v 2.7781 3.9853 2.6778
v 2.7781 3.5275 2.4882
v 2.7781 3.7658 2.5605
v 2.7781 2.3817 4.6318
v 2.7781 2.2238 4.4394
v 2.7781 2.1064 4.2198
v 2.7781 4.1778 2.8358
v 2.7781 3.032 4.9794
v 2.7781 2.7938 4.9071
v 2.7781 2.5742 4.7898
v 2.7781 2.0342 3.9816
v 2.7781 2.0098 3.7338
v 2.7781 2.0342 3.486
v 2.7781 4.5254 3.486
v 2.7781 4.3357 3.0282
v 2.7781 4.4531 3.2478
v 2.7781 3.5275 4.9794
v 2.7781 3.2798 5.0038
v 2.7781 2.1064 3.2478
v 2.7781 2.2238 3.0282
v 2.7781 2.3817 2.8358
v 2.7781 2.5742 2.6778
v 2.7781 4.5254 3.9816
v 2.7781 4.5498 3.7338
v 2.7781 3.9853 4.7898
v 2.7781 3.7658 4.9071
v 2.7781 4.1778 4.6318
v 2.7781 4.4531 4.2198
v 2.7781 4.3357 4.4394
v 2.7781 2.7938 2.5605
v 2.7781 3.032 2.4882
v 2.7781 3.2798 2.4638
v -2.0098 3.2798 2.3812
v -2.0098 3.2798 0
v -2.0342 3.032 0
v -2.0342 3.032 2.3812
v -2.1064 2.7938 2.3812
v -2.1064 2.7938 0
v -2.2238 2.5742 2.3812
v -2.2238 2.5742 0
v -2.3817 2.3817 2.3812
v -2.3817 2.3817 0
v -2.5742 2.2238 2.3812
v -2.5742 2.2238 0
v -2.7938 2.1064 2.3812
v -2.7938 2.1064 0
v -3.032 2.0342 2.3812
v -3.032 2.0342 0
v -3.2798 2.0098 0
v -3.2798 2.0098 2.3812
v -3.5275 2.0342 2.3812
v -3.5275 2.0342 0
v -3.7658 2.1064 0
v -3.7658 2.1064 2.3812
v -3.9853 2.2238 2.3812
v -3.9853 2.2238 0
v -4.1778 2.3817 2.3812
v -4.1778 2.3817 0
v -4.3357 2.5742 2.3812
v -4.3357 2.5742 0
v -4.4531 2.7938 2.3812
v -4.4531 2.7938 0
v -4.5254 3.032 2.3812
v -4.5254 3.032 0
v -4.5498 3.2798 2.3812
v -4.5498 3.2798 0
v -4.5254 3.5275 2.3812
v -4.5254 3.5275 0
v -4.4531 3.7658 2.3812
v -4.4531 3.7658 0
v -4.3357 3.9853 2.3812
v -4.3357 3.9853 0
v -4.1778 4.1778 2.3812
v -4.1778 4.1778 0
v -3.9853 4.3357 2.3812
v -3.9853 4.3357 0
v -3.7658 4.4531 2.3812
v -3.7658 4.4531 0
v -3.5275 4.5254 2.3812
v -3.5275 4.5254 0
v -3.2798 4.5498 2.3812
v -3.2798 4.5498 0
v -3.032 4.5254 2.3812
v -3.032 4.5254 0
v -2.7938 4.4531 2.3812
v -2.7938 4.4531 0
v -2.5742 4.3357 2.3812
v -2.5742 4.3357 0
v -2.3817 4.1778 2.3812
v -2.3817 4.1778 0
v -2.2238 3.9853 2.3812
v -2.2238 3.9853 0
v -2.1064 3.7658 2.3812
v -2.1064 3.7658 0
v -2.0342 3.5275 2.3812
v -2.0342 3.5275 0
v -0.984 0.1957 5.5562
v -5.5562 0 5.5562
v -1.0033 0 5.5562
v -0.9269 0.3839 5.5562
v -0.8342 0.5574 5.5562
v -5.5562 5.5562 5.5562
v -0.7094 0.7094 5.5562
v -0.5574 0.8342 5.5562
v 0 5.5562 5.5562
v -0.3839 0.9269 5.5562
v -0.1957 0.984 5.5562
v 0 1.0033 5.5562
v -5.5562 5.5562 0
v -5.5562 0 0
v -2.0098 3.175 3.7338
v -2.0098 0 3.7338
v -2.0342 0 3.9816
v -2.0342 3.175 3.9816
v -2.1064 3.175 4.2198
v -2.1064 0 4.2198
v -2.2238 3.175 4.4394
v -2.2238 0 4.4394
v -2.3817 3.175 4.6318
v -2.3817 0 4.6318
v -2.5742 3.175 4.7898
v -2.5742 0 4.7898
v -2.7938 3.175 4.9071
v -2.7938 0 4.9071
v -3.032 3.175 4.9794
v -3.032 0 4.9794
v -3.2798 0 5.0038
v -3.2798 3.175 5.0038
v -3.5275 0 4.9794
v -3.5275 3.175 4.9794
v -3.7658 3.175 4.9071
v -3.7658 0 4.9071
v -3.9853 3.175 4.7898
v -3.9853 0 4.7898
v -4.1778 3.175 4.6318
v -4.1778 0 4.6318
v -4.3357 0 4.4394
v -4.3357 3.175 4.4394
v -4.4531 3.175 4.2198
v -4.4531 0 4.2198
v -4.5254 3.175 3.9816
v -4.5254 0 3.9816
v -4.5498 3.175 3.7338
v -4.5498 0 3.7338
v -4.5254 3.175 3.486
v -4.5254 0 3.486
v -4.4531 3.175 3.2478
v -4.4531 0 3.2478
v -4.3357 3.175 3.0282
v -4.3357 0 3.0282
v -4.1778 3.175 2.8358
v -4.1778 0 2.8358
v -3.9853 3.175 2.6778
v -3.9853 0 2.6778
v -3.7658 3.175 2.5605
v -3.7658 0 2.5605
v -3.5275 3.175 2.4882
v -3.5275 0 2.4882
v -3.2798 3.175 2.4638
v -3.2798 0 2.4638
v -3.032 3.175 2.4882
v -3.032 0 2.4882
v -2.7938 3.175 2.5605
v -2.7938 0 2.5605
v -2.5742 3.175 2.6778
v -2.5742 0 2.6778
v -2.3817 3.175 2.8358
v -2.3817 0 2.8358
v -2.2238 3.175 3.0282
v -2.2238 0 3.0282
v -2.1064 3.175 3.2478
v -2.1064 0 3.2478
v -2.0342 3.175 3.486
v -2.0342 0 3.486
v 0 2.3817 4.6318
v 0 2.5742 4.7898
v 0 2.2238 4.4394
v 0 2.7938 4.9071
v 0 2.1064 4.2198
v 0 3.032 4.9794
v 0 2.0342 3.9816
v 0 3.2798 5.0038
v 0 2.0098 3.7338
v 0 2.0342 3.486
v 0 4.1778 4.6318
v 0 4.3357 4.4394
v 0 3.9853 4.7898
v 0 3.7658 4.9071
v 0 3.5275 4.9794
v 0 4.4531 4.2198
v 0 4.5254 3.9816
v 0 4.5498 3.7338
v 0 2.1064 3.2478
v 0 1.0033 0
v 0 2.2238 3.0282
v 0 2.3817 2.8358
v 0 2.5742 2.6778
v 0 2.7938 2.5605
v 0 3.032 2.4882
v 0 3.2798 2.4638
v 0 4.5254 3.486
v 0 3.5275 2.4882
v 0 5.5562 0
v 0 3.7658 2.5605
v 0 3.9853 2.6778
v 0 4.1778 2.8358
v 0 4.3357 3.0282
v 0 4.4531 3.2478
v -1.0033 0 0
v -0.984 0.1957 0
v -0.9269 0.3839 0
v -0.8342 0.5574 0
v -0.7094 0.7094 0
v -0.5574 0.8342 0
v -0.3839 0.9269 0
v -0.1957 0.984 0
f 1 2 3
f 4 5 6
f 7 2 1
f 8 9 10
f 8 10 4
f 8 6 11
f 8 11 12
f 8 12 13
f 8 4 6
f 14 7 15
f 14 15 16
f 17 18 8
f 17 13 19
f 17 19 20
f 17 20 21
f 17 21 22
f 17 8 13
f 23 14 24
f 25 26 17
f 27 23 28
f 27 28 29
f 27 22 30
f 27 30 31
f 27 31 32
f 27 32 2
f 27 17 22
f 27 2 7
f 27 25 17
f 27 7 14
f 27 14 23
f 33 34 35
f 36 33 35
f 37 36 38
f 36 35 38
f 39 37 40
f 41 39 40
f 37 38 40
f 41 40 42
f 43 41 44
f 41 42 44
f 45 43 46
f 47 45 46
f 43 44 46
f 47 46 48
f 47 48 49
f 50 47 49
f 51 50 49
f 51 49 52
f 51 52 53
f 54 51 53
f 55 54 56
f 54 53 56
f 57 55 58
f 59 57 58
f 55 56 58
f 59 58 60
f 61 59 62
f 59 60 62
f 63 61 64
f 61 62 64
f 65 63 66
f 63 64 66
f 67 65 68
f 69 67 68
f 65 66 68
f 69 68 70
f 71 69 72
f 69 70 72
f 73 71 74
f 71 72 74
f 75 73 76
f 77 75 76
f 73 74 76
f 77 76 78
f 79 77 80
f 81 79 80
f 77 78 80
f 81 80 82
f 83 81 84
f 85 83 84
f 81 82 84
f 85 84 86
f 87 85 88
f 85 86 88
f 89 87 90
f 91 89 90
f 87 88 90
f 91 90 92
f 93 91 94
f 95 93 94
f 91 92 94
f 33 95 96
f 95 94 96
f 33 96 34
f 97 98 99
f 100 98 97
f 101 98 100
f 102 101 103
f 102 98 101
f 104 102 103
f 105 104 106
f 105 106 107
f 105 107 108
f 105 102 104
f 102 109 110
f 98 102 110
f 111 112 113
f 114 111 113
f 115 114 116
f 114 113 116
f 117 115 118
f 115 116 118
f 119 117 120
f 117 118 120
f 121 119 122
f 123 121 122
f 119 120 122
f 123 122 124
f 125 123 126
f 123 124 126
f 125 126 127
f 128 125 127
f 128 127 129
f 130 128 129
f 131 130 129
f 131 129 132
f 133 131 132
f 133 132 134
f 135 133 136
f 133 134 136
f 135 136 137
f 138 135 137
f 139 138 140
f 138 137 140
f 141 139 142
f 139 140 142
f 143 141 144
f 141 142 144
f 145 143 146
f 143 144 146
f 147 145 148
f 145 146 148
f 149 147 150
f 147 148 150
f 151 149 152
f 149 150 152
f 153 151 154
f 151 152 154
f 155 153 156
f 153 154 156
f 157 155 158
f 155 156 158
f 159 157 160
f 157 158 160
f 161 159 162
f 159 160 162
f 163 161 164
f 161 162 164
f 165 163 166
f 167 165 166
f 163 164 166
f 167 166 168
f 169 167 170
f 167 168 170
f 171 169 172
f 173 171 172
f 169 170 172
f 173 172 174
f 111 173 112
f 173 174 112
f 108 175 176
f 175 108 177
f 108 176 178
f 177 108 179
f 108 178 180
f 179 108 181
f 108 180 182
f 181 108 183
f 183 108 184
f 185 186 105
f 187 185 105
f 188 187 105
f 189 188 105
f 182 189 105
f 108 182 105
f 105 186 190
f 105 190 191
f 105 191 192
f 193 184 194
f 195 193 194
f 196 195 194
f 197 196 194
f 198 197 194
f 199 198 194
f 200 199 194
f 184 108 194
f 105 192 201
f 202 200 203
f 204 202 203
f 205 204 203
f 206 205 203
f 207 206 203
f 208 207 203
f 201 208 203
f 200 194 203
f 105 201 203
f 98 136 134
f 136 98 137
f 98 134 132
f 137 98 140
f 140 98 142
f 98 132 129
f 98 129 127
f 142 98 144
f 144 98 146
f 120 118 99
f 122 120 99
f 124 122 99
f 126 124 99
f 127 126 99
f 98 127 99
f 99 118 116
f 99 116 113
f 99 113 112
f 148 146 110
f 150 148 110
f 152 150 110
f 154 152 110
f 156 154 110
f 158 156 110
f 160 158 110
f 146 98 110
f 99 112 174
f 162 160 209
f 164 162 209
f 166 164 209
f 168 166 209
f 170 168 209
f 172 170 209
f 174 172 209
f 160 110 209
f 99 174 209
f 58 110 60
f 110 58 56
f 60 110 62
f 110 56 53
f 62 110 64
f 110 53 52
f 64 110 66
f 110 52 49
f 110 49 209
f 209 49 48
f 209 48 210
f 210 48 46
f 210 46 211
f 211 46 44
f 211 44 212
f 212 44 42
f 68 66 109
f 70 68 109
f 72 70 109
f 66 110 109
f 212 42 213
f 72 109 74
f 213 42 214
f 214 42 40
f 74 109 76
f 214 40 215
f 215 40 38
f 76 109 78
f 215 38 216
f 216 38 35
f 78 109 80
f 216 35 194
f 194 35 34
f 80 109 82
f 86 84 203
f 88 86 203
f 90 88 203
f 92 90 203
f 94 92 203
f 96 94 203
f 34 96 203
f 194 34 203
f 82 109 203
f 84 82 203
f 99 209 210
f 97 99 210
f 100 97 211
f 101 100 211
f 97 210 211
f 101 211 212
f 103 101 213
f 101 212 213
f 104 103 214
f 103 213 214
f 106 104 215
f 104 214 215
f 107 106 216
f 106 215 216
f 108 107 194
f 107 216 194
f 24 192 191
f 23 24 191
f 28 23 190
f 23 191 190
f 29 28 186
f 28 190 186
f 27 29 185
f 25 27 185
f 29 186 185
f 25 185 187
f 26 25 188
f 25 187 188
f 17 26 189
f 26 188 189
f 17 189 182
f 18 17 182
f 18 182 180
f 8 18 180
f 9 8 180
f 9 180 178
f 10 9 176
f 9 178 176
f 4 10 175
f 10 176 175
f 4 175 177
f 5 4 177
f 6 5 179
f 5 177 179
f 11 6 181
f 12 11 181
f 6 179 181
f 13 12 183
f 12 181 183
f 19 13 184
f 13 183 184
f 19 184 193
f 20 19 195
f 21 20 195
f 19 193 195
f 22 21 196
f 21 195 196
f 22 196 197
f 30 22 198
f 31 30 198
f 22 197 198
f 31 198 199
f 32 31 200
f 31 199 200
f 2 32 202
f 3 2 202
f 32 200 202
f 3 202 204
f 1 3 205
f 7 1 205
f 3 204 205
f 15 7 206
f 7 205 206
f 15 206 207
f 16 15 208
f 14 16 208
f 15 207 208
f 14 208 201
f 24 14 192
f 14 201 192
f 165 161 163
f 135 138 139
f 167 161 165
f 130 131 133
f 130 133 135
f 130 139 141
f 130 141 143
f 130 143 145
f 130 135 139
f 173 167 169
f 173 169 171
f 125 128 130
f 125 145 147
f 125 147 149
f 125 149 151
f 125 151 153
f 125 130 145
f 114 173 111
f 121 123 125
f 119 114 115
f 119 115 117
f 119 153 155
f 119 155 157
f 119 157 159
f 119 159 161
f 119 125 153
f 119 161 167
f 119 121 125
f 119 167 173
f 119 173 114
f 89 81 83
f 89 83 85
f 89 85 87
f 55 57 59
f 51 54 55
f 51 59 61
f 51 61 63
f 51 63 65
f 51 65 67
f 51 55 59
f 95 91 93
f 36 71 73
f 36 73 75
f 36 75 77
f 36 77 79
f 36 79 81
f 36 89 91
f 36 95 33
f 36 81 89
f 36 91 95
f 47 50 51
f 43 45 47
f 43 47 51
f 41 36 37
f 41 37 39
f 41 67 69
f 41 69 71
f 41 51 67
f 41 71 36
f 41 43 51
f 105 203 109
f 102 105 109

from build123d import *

# Parameters (mm, degrees)
F1_DEPTH = 5.55625
F3_R     = 1.27
F4_DEPTH = 3.175
F5_R     = 1.27
F6_DEPTH = 2.38125
F2_R     = 1.27
F7_DEPTH = 2.778125


with BuildPart() as f1:
    # F0 (on Top) → F1 (new body)
    with BuildSketch(Plane.XY):
        with BuildLine():
            Line((-5.55625, 0), (-1.0033, 0))
            ThreePointArc((-1.0033, 0), (-0.70944, 0.70944), (0, 1.0033))
            Line((0, 1.0033), (0, 5.55625))
            Line((0, 5.55625), (-5.55625, 5.55625))
            Line((-5.55625, 5.55625), (-5.55625, 0))
        make_face()
    extrude(amount=F1_DEPTH)

    # F3 (on face) → F4 (cut)
    with BuildSketch(Plane.XZ):
        with Locations((-3.279775, 3.7338)):
            Circle(F3_R)
    extrude(amount=-F4_DEPTH, mode=Mode.SUBTRACT)

    # F5 (on face) → F6 (cut)
    with BuildSketch(Plane(origin=(0, 0, 0), x_dir=(1, 0, 0), z_dir=(0, 0, -1))):
        with Locations((-3.279775, -3.279775)):
            Circle(F5_R)
    extrude(amount=-F6_DEPTH, mode=Mode.SUBTRACT)

    # F2 (on face) → F7 (join)
    with BuildSketch(Plane.YZ):
        with Locations((3.279775, 3.7338)):
            Circle(F2_R)
    extrude(amount=F7_DEPTH)


with BuildPart() as f8_1:
    # F8: copy of F1
    add(f1.part.moved(Location((25.4, 0, 0))))


solid = f1.part
